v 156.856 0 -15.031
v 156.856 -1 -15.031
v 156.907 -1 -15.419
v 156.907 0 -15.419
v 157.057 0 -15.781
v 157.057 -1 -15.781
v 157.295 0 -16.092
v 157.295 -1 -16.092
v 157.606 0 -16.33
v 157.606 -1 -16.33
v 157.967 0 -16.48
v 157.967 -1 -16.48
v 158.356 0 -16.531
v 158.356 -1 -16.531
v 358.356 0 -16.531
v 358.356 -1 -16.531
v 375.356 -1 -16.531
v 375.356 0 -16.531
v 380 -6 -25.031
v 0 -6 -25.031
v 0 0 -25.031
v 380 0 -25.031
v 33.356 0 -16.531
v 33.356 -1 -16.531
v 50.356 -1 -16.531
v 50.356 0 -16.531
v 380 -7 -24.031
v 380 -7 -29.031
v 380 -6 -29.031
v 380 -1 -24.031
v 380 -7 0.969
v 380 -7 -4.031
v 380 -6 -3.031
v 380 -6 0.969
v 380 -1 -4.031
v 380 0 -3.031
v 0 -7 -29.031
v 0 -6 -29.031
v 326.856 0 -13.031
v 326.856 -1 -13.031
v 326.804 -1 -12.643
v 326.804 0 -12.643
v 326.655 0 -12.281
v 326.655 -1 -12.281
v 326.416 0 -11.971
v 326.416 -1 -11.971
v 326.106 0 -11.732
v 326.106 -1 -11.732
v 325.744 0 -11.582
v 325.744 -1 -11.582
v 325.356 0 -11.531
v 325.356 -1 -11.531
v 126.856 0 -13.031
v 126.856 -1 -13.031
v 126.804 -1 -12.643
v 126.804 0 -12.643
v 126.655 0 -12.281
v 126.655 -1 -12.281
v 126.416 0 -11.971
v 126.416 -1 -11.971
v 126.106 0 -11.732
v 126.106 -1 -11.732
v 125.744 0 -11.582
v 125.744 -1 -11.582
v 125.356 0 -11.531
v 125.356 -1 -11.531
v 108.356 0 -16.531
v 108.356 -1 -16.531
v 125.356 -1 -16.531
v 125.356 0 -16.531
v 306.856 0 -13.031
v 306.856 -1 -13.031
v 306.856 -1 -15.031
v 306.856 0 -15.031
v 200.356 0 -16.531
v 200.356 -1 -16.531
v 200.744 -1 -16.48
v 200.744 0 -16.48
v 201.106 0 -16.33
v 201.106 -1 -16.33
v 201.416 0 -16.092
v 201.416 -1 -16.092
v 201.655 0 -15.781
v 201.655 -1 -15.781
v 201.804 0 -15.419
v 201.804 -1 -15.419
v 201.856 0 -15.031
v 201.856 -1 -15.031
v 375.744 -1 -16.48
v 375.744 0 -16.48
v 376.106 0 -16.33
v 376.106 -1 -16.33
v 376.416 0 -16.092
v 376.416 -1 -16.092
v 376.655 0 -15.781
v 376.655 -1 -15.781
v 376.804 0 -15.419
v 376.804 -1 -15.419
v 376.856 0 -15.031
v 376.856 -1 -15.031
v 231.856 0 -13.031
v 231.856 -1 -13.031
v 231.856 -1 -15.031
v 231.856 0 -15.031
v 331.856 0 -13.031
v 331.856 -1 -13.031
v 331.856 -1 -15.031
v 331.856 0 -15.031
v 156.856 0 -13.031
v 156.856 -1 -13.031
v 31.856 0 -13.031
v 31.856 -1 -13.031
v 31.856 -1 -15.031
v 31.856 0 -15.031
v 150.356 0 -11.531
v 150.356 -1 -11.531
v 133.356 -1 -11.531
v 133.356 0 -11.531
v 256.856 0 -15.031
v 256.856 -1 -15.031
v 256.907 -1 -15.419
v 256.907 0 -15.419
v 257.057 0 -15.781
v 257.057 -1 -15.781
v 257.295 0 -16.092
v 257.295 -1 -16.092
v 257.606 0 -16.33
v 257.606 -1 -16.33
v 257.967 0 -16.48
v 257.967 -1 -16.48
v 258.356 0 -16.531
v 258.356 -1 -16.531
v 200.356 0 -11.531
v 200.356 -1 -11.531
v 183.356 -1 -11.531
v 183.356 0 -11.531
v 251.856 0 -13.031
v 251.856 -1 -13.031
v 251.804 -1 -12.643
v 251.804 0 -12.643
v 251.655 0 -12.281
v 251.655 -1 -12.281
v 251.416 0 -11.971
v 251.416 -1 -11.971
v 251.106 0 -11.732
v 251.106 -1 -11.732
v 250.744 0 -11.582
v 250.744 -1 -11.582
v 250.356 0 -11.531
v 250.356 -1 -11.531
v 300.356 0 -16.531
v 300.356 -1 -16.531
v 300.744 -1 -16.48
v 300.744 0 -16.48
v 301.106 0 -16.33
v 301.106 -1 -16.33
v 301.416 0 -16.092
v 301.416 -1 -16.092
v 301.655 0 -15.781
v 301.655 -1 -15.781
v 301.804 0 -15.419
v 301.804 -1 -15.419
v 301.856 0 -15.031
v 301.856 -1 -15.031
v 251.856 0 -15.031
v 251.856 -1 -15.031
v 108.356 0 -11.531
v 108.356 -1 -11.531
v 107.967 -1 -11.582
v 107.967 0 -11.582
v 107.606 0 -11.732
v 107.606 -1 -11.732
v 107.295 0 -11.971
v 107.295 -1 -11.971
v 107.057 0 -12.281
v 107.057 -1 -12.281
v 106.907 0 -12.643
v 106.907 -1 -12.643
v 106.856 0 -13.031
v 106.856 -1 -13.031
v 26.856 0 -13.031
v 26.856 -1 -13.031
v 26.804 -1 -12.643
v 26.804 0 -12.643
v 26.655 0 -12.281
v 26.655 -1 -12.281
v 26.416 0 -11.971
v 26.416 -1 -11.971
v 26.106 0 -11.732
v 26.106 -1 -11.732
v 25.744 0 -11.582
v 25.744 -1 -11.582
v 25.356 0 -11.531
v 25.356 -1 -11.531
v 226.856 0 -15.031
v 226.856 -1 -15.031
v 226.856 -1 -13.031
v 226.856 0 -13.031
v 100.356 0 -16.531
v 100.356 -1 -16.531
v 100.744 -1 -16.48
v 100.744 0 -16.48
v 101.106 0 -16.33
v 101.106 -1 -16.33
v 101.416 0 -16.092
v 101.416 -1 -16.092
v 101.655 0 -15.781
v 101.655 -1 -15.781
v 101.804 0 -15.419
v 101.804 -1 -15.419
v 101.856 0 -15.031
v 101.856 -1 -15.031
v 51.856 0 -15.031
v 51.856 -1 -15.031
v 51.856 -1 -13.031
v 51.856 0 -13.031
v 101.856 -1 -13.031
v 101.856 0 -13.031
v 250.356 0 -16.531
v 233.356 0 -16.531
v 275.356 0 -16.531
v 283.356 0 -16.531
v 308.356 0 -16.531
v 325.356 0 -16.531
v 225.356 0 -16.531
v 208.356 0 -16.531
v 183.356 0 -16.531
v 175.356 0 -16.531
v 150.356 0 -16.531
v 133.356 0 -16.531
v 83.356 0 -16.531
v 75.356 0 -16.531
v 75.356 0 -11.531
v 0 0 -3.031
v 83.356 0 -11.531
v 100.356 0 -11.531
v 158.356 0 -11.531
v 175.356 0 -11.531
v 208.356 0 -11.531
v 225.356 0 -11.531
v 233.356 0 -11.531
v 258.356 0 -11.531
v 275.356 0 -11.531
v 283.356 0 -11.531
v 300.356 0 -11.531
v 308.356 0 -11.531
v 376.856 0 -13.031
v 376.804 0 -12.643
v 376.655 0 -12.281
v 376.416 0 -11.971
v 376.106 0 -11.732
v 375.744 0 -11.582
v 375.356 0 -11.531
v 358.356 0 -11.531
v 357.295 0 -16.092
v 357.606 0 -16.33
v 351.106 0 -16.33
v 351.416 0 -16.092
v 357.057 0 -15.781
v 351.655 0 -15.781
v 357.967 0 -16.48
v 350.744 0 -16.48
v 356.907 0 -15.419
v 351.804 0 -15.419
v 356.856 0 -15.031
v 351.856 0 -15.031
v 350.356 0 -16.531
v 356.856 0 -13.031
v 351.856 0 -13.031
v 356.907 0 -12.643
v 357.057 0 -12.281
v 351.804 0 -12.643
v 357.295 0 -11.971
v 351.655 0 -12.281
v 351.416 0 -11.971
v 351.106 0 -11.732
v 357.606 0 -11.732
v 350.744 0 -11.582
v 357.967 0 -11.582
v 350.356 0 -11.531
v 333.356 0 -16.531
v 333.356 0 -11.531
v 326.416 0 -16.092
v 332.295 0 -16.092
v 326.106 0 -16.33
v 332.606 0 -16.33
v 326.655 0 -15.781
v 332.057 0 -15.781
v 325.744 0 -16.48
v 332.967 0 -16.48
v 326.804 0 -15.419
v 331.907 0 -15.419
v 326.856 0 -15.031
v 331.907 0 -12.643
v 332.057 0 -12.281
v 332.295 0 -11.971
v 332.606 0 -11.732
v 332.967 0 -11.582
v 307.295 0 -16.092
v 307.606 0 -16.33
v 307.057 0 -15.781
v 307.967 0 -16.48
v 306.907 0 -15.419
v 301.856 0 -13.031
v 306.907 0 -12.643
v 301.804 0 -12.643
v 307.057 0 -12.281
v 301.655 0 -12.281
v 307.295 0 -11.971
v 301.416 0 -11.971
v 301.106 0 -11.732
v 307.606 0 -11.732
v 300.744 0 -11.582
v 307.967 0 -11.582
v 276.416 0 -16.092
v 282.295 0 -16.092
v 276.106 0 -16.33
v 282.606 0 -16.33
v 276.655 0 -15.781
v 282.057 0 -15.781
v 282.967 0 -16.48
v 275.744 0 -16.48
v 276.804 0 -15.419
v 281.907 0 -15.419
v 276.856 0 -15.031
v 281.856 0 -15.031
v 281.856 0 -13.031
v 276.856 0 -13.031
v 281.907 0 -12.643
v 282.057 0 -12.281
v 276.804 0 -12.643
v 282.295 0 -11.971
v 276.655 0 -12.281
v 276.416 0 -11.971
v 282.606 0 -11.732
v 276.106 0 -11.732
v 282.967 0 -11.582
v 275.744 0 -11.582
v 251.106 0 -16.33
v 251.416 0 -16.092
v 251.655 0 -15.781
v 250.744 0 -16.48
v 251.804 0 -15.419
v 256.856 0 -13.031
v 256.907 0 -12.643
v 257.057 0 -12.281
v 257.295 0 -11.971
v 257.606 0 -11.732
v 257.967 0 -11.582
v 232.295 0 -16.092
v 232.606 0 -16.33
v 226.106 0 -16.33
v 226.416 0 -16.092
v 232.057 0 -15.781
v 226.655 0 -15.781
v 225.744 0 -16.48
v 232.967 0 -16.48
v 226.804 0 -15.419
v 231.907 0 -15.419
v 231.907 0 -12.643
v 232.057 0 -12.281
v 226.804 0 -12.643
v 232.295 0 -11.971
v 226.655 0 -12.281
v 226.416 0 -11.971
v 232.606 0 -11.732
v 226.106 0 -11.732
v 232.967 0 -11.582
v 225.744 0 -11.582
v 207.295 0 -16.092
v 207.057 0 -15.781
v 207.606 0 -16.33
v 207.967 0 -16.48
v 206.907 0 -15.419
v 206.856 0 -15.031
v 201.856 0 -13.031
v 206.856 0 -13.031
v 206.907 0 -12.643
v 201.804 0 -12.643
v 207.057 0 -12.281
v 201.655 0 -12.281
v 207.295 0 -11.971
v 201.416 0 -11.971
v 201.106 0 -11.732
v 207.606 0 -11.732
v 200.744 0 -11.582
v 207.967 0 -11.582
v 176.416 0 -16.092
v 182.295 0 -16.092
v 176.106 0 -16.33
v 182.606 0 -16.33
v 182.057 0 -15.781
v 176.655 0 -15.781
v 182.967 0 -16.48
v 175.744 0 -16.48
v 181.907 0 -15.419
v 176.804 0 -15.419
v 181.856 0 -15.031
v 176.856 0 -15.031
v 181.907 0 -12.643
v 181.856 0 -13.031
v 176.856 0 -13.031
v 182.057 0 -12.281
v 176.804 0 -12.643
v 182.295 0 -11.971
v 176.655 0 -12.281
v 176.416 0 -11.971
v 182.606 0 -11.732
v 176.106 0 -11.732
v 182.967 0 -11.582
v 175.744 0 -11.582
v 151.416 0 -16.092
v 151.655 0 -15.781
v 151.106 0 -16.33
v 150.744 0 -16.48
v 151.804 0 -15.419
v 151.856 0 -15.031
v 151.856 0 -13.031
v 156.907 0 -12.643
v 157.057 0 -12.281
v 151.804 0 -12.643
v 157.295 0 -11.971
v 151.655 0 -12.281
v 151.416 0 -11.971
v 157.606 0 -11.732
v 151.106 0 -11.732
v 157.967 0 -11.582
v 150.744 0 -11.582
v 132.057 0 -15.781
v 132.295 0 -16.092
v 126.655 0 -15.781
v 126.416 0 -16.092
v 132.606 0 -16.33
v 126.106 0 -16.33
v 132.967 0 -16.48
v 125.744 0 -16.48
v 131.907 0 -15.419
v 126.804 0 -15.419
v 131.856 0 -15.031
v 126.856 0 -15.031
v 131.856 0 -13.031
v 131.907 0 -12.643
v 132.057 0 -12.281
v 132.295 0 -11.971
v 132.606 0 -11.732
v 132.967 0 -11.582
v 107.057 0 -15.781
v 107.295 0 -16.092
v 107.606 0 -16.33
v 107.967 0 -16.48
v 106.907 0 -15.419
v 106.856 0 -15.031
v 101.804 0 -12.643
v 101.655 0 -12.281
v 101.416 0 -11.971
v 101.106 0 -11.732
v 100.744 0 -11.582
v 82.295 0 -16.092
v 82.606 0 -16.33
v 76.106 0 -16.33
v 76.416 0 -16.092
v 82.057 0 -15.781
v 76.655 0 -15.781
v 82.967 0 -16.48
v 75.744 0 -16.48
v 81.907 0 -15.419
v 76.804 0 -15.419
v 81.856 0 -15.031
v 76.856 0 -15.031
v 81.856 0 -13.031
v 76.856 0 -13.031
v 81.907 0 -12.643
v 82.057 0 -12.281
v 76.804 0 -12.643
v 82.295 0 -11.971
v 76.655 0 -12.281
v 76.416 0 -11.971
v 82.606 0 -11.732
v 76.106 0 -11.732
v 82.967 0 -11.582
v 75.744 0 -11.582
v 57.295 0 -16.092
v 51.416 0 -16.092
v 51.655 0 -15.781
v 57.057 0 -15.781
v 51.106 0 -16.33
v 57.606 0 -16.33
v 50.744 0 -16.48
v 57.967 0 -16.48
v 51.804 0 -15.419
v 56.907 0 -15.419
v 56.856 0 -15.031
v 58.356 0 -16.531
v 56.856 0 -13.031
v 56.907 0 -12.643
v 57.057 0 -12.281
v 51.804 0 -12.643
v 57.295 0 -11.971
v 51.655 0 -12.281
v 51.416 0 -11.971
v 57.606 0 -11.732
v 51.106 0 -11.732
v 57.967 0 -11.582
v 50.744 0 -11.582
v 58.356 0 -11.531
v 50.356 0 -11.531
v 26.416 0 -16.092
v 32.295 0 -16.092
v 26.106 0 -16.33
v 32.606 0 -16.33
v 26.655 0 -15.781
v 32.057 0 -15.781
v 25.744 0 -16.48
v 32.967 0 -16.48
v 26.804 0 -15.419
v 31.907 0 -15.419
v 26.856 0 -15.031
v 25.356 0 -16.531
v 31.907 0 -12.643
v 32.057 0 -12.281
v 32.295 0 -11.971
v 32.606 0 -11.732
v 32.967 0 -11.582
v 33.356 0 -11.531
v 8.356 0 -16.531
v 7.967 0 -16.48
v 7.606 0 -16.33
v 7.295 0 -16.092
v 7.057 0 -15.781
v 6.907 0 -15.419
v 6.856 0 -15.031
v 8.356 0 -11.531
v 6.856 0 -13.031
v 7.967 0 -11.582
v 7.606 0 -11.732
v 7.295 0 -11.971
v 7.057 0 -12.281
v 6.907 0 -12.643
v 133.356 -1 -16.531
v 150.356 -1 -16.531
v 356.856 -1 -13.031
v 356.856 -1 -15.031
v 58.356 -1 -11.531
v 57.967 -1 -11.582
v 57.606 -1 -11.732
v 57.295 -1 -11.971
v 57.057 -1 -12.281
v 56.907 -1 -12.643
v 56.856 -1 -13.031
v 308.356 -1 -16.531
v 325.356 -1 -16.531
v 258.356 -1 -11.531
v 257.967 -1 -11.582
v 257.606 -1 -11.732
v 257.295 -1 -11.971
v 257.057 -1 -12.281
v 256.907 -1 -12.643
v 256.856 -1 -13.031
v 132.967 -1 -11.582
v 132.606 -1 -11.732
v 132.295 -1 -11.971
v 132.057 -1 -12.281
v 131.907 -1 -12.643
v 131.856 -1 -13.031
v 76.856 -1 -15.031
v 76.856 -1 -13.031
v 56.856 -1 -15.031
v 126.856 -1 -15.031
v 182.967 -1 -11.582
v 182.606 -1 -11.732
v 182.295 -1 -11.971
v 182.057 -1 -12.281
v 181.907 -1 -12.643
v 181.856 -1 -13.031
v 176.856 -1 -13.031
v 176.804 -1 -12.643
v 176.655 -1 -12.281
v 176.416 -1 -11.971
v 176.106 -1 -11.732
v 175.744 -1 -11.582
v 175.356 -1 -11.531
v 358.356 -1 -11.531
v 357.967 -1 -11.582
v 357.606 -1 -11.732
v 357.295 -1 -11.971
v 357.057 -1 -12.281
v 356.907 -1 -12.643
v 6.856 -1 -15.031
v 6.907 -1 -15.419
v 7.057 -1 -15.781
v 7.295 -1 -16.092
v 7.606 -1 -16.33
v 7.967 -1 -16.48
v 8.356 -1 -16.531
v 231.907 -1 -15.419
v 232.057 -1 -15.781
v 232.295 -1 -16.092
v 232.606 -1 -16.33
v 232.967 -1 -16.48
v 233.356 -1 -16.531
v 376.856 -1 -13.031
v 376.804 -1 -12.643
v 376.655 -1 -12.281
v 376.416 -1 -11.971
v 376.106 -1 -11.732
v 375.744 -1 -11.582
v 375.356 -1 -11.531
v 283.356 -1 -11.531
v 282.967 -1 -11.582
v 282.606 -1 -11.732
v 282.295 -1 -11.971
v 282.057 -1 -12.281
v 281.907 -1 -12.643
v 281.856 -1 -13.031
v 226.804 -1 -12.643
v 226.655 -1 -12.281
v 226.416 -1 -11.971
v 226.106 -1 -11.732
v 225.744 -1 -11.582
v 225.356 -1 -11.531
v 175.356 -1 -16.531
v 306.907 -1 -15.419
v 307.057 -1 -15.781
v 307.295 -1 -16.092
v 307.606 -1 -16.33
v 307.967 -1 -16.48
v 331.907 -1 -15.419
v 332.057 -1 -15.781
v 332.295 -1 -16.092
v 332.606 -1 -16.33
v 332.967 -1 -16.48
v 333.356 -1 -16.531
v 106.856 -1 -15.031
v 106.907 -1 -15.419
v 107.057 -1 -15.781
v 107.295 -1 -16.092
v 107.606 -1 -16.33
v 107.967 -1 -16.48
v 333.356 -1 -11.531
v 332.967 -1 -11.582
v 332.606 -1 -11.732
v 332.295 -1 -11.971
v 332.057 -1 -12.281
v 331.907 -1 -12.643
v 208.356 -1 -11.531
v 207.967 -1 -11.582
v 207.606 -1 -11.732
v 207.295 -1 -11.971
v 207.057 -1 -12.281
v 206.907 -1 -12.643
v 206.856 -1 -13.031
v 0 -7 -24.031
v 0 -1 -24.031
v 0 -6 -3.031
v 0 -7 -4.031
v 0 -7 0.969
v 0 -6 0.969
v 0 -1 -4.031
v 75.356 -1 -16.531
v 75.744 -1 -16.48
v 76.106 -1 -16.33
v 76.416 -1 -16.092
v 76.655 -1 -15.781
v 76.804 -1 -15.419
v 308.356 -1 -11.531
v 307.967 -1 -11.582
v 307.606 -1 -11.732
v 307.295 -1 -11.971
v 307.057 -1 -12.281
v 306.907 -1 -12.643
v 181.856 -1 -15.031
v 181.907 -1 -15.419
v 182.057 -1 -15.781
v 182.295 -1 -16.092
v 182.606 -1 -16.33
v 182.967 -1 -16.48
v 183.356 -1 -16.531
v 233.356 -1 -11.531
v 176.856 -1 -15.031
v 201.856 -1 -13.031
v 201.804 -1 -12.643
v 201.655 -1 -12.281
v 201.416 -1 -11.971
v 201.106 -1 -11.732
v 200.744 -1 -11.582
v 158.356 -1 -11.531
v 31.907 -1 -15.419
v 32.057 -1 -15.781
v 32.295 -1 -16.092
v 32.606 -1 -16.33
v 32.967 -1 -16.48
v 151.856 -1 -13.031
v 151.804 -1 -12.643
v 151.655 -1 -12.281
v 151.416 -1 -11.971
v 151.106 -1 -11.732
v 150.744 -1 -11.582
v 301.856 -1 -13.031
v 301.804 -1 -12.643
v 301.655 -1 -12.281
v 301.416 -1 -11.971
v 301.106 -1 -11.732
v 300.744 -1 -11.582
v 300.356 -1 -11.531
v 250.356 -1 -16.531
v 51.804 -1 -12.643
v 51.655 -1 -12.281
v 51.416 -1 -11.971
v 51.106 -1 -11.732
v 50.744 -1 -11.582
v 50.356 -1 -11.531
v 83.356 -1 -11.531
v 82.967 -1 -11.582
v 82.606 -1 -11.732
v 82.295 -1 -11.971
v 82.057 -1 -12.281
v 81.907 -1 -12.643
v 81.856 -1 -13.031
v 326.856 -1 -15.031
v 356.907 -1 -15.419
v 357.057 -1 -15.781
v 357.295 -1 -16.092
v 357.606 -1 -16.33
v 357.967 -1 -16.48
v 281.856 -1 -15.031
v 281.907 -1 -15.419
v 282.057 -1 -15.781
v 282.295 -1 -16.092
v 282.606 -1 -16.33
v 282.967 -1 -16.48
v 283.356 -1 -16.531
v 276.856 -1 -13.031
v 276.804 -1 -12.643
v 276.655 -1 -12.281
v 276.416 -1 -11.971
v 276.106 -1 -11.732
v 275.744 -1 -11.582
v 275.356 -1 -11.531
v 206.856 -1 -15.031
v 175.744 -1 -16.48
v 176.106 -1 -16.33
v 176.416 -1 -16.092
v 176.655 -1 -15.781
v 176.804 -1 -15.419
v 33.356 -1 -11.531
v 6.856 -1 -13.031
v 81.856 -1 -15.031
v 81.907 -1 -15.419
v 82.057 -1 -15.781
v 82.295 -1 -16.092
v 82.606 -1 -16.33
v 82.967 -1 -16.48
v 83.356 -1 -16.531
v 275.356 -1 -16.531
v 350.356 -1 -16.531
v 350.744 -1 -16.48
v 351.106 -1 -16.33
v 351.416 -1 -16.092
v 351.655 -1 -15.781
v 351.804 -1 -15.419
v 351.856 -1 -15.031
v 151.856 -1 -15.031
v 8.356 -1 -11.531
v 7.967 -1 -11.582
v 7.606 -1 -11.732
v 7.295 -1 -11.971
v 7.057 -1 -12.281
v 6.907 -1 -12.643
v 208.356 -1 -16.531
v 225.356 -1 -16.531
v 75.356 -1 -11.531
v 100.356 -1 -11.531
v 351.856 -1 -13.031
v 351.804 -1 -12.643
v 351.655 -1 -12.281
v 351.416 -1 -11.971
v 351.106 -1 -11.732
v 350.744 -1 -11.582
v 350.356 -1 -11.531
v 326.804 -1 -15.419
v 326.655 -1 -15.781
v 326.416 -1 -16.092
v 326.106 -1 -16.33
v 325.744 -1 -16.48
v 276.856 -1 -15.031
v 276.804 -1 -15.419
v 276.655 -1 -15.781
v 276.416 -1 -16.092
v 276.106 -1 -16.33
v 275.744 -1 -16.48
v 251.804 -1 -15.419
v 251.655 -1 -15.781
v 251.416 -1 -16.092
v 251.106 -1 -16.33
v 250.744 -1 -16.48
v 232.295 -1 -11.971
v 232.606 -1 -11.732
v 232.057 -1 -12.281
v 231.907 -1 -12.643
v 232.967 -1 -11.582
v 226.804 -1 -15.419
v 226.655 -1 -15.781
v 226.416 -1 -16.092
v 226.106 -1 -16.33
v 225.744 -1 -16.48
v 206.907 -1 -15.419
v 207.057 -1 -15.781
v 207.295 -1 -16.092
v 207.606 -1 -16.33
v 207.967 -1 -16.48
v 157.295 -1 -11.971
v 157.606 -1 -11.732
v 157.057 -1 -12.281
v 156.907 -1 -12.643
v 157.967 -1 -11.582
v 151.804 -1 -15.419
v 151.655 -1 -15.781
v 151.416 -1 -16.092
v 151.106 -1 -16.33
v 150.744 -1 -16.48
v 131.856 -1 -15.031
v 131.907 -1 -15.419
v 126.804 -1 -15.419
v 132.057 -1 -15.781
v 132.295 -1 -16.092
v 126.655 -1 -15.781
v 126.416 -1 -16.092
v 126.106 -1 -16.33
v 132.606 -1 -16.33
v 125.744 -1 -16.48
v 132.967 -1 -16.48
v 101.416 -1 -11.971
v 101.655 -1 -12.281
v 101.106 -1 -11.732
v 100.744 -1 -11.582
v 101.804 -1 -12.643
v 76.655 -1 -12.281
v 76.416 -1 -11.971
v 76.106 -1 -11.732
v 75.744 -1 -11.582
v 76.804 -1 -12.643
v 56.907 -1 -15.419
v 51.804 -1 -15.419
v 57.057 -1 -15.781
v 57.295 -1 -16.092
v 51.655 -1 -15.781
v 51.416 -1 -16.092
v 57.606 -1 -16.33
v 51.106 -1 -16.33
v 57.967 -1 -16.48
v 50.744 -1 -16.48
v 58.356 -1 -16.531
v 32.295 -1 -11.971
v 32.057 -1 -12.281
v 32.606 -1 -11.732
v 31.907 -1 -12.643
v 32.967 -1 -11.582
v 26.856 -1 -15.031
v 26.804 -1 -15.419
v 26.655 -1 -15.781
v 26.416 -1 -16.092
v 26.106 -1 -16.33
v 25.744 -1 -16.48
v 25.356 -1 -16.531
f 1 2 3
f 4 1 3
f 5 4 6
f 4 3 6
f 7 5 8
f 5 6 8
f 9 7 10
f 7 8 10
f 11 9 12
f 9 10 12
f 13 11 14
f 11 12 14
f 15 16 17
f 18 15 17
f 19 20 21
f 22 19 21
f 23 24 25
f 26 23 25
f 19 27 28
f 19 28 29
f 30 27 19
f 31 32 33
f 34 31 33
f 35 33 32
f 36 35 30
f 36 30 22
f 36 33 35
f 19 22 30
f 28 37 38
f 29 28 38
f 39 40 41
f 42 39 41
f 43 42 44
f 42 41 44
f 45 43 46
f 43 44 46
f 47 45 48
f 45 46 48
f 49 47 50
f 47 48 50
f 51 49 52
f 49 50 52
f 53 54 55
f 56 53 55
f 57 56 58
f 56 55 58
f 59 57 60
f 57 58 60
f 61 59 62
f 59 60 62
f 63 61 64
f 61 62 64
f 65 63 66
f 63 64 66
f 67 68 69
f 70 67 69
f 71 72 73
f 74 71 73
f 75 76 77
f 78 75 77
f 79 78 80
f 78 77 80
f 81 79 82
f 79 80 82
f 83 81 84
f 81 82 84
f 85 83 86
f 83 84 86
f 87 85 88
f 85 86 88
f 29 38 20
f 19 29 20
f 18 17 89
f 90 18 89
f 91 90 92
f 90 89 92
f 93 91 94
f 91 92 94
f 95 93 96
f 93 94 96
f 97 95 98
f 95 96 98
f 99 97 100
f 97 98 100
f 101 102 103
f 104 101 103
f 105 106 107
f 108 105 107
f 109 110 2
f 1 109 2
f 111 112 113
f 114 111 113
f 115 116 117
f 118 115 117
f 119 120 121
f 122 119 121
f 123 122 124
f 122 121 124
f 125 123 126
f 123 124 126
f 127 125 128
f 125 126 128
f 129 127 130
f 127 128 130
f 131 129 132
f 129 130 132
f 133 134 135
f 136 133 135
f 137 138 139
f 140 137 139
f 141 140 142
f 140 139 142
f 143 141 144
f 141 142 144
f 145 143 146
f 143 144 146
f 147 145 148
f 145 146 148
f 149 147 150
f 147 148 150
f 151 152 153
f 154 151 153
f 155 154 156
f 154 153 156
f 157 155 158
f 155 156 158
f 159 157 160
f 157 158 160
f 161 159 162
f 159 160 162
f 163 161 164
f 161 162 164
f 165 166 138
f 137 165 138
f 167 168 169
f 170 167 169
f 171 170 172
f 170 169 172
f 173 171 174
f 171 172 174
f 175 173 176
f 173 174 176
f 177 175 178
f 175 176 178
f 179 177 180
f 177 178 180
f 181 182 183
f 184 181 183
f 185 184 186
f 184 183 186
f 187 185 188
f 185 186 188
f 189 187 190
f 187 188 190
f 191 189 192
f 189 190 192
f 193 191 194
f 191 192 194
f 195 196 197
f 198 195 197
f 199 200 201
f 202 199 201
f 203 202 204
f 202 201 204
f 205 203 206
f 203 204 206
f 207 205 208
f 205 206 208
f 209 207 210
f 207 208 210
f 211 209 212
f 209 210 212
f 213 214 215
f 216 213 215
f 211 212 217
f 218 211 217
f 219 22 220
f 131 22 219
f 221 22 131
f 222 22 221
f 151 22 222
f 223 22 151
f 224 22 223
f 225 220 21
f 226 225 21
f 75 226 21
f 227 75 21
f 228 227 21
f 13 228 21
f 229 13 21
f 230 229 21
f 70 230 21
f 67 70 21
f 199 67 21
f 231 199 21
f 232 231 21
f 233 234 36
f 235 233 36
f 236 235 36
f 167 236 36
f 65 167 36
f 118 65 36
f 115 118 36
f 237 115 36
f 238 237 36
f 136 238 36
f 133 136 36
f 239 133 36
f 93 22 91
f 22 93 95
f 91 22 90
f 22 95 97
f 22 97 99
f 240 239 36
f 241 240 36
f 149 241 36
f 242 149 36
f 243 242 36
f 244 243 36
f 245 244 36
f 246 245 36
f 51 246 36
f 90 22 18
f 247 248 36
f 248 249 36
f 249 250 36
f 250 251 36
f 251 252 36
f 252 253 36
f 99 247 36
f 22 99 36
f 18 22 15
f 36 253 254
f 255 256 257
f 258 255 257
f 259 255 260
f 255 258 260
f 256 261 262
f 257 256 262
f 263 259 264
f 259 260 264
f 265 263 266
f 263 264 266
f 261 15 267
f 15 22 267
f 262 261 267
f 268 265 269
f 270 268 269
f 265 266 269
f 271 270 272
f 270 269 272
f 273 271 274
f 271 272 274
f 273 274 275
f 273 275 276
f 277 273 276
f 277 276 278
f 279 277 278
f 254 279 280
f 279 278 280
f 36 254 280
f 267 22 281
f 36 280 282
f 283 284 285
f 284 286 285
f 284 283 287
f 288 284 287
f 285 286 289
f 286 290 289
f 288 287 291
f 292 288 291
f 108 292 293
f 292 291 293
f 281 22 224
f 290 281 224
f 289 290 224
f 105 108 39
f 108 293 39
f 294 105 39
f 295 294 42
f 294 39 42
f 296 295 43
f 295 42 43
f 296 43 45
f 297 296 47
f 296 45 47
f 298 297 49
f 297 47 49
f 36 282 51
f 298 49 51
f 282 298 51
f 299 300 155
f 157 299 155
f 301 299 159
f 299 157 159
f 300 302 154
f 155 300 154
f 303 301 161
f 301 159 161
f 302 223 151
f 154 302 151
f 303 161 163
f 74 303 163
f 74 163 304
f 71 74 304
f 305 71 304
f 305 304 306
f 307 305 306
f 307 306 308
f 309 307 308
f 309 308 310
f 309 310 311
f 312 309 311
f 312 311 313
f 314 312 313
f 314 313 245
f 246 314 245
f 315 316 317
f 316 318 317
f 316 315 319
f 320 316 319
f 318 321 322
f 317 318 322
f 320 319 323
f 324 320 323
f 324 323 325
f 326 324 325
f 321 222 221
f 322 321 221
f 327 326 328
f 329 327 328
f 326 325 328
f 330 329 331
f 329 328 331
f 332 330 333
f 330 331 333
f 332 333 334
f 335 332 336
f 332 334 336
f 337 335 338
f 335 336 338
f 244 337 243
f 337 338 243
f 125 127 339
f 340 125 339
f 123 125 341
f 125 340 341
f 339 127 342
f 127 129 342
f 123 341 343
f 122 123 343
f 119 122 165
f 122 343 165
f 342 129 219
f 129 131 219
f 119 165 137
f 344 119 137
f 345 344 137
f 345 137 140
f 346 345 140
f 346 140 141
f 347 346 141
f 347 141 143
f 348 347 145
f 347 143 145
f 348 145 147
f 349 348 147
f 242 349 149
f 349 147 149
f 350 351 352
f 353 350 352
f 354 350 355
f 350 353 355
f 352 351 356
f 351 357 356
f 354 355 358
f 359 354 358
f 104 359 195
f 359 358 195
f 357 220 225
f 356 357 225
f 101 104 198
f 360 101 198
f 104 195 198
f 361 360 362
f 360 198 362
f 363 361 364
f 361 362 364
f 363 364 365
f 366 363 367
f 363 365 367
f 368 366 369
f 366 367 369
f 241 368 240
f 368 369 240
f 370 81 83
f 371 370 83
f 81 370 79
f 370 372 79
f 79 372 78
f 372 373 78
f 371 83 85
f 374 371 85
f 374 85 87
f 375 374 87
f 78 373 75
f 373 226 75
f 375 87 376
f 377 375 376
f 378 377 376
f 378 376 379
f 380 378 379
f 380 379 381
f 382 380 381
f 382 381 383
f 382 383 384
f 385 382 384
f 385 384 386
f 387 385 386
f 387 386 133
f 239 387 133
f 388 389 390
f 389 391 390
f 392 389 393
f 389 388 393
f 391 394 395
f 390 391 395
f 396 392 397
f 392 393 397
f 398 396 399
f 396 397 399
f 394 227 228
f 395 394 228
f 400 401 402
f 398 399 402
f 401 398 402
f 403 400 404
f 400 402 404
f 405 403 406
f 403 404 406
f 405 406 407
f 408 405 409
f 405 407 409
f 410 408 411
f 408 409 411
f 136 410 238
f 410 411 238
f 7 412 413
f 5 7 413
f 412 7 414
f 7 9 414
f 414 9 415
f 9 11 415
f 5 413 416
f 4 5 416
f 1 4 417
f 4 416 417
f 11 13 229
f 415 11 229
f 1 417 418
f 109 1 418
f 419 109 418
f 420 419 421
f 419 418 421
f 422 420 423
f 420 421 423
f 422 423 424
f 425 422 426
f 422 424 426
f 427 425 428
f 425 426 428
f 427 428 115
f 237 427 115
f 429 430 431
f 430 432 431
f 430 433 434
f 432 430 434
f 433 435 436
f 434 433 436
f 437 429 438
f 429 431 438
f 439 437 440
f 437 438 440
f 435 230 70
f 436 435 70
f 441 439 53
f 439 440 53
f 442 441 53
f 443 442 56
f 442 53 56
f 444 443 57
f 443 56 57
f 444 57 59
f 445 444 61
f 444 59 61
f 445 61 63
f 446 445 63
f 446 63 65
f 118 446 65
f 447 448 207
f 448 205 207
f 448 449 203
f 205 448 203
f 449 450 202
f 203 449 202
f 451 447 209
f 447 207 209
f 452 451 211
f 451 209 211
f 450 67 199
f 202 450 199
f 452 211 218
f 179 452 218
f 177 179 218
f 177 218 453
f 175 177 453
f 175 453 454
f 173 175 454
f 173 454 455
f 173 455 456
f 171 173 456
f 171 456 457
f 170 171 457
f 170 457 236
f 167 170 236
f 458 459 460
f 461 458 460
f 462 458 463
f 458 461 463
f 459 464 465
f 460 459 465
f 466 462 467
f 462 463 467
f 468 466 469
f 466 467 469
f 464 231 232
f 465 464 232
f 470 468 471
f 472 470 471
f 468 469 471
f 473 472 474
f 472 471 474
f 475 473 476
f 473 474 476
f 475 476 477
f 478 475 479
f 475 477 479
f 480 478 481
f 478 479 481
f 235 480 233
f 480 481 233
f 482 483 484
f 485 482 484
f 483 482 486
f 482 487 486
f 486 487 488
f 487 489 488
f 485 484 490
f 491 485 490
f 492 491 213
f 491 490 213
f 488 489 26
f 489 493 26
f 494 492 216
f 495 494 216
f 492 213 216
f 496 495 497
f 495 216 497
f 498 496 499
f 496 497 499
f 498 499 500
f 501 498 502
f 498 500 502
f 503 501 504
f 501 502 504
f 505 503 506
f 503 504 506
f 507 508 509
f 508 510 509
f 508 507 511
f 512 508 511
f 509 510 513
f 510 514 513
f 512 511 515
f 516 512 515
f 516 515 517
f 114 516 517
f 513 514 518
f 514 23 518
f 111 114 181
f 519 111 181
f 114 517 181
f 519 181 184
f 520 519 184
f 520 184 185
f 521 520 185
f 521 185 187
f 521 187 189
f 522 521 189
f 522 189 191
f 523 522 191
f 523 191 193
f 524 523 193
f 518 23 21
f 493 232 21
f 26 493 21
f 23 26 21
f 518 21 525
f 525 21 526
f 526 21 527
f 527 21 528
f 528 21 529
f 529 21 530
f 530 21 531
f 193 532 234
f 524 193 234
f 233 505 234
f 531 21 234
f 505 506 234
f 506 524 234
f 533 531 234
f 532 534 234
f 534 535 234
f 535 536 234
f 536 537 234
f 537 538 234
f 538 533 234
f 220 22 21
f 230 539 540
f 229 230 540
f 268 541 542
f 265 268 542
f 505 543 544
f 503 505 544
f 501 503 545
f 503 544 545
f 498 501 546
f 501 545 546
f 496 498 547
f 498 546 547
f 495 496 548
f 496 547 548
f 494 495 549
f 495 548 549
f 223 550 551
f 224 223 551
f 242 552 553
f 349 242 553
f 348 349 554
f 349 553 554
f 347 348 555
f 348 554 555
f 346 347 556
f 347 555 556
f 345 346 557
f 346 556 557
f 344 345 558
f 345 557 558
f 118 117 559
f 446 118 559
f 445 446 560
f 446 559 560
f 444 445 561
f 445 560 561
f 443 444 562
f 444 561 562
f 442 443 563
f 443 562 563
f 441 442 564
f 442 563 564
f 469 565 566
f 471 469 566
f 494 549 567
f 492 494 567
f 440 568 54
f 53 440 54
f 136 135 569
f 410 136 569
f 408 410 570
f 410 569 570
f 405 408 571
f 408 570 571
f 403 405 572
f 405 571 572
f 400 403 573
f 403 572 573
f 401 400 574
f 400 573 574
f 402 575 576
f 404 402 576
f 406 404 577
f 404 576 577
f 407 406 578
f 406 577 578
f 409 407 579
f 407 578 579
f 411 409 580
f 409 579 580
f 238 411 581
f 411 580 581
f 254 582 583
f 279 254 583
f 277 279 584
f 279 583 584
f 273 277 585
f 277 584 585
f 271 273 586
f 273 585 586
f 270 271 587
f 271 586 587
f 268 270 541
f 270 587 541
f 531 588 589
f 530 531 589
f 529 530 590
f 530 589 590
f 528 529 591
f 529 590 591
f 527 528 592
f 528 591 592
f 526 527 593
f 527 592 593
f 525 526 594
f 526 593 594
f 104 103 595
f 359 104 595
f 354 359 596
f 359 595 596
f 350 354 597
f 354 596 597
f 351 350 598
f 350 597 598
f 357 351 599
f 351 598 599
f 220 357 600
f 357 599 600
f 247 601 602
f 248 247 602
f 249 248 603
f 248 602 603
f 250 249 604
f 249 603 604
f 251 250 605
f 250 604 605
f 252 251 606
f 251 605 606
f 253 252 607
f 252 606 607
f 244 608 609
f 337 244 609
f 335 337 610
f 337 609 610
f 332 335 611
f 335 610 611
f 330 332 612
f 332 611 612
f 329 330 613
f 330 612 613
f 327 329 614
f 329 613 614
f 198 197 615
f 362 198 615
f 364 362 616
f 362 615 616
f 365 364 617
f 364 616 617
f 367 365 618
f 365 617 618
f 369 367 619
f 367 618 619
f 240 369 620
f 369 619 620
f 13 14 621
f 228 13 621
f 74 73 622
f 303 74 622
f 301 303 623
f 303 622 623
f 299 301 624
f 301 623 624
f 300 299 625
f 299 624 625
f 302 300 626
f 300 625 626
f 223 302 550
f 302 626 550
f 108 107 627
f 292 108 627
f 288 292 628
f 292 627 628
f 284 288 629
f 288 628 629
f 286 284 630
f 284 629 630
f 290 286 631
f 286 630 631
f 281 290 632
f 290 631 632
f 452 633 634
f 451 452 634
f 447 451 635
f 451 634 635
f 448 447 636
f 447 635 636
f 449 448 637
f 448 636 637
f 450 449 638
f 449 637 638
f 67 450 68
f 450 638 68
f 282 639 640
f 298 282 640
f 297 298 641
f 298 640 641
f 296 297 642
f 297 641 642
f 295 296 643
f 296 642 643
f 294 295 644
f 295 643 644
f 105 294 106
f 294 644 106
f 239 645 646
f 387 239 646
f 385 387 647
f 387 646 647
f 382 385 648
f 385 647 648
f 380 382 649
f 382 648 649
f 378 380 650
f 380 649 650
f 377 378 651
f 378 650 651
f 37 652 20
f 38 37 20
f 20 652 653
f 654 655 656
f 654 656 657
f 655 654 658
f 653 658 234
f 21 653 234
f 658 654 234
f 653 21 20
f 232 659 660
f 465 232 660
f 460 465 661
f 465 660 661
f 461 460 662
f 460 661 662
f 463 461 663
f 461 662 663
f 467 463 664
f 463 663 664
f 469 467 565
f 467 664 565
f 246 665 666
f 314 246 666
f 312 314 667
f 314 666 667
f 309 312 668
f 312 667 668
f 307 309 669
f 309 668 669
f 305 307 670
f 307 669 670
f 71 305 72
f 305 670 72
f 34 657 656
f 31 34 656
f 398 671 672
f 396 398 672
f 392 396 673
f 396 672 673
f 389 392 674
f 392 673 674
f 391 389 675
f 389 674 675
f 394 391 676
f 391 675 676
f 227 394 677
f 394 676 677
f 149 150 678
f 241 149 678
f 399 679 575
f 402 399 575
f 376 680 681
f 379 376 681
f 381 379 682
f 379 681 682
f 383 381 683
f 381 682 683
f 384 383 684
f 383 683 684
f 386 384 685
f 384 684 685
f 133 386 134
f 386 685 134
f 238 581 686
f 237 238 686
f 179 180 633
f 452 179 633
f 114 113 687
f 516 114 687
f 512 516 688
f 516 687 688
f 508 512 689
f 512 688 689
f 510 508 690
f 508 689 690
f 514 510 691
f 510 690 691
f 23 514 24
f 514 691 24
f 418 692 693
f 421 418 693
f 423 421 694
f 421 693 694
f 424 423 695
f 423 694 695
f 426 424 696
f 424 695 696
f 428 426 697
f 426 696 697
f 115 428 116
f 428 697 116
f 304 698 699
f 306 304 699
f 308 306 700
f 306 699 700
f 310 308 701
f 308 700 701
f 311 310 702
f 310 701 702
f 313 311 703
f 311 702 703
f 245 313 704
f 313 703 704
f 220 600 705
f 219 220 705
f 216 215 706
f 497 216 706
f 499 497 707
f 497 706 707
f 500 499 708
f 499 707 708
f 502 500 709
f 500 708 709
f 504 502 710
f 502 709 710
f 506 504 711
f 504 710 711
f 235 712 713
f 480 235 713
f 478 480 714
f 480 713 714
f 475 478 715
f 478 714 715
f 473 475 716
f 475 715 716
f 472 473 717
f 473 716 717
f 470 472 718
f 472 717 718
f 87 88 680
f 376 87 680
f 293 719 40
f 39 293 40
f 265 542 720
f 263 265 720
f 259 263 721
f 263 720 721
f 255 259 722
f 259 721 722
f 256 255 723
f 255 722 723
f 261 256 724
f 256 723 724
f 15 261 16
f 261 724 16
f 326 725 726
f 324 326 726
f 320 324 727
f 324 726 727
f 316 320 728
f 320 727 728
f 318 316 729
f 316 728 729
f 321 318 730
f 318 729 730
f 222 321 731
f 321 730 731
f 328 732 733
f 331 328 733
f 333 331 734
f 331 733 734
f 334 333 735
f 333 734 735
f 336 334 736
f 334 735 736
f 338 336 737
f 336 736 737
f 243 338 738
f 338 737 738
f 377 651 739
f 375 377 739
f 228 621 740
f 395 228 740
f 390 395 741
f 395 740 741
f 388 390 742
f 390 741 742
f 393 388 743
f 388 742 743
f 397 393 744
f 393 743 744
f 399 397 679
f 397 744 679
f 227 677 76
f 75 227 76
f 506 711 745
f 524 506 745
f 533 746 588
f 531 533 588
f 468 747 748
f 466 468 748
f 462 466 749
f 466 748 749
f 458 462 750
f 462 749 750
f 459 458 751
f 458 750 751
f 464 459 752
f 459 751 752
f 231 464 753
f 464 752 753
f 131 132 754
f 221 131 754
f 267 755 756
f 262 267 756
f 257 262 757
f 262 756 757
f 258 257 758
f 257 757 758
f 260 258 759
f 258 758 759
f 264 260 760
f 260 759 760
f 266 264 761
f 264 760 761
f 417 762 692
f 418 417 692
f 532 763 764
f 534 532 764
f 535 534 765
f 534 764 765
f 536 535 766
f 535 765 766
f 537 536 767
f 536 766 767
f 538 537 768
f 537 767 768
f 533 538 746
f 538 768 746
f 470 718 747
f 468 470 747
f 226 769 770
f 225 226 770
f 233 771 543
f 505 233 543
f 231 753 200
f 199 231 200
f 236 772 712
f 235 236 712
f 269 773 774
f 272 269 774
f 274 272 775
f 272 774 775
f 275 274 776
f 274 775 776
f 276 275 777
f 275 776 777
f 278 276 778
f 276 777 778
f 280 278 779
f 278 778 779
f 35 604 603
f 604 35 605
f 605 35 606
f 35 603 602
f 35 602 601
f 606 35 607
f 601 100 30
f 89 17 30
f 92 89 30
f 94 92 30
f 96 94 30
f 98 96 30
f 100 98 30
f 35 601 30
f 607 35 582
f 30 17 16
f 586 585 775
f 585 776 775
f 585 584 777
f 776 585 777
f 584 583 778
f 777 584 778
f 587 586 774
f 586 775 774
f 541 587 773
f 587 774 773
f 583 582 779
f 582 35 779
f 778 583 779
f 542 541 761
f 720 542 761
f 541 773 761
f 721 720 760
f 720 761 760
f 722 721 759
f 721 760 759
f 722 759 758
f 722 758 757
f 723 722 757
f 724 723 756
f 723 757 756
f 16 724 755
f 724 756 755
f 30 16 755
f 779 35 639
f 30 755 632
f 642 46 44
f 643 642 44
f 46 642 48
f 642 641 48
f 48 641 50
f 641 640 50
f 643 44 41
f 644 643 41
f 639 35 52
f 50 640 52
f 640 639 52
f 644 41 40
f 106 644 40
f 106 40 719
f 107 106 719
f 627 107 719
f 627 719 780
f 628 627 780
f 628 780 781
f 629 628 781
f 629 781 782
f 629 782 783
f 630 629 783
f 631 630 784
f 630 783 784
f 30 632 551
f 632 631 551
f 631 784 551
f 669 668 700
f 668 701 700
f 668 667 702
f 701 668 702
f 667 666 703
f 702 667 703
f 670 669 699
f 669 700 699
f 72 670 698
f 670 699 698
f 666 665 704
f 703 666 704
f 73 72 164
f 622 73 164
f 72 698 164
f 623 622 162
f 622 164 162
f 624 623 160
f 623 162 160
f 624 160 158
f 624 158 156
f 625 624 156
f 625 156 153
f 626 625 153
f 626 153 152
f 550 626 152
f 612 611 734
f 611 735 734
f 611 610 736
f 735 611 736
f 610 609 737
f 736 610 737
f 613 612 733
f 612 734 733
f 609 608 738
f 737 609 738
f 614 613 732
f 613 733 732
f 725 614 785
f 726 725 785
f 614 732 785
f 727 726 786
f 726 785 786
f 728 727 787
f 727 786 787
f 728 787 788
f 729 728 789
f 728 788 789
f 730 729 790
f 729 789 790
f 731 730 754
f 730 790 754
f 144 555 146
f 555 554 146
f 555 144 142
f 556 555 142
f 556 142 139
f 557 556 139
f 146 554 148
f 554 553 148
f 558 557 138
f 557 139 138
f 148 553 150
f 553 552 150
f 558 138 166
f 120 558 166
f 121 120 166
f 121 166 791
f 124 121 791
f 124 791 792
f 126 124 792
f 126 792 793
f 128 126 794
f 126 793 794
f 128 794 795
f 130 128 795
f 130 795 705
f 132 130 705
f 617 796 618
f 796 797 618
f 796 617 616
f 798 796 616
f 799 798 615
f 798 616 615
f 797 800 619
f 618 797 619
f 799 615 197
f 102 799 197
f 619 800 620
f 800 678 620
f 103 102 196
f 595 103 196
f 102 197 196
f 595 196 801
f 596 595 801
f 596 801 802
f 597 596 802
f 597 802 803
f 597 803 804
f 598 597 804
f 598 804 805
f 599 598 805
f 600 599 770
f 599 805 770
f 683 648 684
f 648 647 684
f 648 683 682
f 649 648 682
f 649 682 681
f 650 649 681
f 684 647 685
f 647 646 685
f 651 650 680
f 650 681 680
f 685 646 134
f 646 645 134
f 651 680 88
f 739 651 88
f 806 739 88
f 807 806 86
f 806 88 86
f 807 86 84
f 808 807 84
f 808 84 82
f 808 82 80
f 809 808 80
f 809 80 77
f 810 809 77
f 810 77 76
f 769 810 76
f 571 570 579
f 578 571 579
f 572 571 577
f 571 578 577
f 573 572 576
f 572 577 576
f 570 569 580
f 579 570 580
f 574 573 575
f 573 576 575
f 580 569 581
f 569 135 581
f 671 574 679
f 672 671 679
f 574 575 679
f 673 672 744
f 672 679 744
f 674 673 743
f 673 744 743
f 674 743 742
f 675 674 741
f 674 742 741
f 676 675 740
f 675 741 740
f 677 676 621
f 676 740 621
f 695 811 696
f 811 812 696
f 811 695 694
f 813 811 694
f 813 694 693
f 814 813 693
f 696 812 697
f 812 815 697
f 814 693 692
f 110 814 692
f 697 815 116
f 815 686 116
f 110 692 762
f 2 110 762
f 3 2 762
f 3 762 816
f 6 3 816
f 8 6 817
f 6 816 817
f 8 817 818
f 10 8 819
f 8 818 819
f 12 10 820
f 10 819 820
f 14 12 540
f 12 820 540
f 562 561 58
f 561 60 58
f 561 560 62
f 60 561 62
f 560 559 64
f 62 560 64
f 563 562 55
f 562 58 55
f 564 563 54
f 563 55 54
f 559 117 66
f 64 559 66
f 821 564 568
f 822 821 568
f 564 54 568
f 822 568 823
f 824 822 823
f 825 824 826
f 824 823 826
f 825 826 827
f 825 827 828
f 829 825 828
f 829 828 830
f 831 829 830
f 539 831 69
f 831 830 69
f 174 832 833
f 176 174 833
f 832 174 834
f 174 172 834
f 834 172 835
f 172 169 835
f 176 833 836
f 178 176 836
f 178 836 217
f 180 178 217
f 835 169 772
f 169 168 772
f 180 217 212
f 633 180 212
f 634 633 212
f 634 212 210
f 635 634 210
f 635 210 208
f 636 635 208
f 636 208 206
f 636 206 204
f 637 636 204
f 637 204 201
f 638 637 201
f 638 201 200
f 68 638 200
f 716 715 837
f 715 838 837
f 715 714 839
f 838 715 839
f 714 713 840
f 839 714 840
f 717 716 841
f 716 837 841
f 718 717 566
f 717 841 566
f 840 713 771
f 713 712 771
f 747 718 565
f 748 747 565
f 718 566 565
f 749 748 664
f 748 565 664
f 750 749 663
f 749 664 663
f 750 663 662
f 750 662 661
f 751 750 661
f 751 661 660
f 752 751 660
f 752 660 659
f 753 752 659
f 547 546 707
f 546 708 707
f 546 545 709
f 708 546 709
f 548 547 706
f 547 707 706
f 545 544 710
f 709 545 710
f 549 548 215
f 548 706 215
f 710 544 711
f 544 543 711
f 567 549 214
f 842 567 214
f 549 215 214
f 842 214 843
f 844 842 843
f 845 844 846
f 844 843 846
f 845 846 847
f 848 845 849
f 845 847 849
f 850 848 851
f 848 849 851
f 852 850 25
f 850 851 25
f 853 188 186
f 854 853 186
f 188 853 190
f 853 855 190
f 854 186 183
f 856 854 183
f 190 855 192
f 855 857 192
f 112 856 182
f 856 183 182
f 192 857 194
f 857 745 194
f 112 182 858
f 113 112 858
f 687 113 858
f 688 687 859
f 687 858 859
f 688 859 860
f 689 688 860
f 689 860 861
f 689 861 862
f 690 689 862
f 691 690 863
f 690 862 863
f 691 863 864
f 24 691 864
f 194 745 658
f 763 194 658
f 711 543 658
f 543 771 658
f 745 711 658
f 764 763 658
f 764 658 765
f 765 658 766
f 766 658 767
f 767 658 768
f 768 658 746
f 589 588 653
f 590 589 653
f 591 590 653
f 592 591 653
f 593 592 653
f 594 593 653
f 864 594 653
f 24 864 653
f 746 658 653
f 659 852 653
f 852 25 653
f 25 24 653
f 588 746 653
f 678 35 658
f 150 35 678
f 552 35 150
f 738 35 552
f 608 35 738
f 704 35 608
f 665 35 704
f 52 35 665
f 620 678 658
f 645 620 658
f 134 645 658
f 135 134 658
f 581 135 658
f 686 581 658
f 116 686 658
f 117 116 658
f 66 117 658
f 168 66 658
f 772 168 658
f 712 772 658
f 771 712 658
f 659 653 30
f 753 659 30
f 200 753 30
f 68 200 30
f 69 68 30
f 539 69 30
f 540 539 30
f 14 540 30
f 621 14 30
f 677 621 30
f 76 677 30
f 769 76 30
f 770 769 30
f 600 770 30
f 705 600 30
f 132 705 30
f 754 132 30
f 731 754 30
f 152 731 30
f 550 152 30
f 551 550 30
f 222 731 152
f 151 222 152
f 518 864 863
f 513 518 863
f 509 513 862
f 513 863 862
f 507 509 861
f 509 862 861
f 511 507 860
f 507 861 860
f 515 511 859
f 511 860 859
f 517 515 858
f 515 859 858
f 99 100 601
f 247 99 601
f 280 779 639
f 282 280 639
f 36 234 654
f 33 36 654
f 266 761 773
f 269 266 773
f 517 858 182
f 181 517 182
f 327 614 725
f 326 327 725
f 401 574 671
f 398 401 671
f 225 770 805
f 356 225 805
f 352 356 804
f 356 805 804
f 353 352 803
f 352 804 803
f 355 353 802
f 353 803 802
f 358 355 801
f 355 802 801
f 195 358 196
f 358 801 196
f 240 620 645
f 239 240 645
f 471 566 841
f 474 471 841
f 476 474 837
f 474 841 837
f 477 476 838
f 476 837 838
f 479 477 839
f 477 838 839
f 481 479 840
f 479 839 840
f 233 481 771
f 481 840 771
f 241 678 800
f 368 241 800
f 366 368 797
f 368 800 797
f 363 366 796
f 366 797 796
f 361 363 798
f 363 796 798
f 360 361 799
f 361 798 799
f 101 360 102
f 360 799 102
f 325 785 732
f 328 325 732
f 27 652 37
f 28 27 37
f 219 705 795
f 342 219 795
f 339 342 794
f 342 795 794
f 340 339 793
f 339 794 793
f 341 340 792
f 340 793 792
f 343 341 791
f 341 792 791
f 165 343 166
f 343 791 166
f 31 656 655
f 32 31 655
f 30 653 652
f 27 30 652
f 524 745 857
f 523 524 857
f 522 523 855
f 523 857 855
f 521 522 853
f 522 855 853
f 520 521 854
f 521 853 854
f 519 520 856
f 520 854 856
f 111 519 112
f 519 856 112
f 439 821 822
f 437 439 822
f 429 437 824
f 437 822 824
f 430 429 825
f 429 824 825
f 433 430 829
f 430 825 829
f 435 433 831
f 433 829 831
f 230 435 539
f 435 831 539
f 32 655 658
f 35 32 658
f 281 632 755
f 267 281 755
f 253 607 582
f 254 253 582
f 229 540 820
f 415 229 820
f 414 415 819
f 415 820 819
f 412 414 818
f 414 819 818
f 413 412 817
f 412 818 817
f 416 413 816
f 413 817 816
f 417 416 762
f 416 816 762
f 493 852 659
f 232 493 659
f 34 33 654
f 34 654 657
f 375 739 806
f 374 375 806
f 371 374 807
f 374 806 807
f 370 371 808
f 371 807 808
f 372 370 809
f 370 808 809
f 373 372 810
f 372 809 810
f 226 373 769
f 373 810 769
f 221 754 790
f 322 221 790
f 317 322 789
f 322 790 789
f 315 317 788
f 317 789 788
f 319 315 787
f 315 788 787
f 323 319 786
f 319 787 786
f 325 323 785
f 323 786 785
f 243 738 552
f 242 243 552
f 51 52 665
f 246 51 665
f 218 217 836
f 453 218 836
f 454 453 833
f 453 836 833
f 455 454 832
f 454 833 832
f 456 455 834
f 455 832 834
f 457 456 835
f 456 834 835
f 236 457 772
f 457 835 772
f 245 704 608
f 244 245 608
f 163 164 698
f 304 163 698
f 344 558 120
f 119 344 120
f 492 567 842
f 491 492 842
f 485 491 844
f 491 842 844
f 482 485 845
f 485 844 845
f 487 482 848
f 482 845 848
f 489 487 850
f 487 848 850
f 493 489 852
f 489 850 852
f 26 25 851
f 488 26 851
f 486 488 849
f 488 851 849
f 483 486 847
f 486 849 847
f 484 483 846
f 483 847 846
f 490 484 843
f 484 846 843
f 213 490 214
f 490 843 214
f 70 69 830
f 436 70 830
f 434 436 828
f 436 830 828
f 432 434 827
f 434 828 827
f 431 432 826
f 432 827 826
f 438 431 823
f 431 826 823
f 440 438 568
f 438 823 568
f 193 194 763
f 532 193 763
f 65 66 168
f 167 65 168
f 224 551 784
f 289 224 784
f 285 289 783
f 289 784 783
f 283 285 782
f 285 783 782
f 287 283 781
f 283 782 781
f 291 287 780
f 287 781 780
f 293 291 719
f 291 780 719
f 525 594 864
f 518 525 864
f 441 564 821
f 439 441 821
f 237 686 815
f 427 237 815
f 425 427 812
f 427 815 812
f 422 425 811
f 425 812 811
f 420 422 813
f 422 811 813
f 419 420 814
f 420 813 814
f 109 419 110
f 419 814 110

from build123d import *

# Parameters (mm, degrees)
F1_DEPTH = 380
F3_DEPTH = 25


with BuildPart() as f1:
    # F0 (on Right) → F1 (new body)
    with BuildSketch(Plane.YZ):
        Polygon((0, -25.031198), (0, -3.031198), (-6, -3.031198), (-6, 0.968802), (-7, 0.968802), (-7, -4.031198), (-1, -4.031198), (-1, -24.031198), (-7, -24.031198), (-7, -29.031198), (-6, -29.031198), (-6, -25.031198), align=None)
    extrude(amount=F1_DEPTH)

    # F2 (on face) → F3 (cut)
    with BuildSketch(Plane.XZ.offset(1)):
        with BuildLine():
            Line((6.85557, -13.031198), (6.85557, -14.031198))
            Line((6.85557, -14.031198), (26.85557, -14.031198))
            Line((26.85557, -14.031198), (26.85557, -13.031198))
            ThreePointArc((26.85557, -13.031198), (26.41623, -11.970538), (25.35557, -11.531198))
            Line((25.35557, -11.531198), (8.35557, -11.531198))
            ThreePointArc((8.35557, -11.531198), (7.294909, -11.970538), (6.85557, -13.031198))
        make_face()
        with BuildLine():
            Line((26.85557, -14.031198), (6.85557, -14.031198))
            Line((6.85557, -14.031198), (6.85557, -15.031198))
            ThreePointArc((6.85557, -15.031198), (7.294909, -16.091858), (8.35557, -16.531198))
            Line((8.35557, -16.531198), (25.35557, -16.531198))
            ThreePointArc((25.35557, -16.531198), (26.41623, -16.091858), (26.85557, -15.031198))
            Line((26.85557, -15.031198), (26.85557, -14.031198))
        make_face()
        with BuildLine():
            Line((31.85557, -13.031198), (31.85557, -14.031198))
            Line((31.85557, -14.031198), (51.85557, -14.031198))
            Line((51.85557, -14.031198), (51.85557, -13.031198))
            ThreePointArc((51.85557, -13.031198), (51.41623, -11.970538), (50.35557, -11.531198))
            Line((50.35557, -11.531198), (33.35557, -11.531198))
            ThreePointArc((33.35557, -11.531198), (32.294909, -11.970538), (31.85557, -13.031198))
        make_face()
        with BuildLine():
            Line((51.85557, -14.031198), (31.85557, -14.031198))
            Line((31.85557, -14.031198), (31.85557, -15.031198))
            ThreePointArc((31.85557, -15.031198), (32.294909, -16.091858), (33.35557, -16.531198))
            Line((33.35557, -16.531198), (50.35557, -16.531198))
            ThreePointArc((50.35557, -16.531198), (51.41623, -16.091858), (51.85557, -15.031198))
            Line((51.85557, -15.031198), (51.85557, -14.031198))
        make_face()
        with BuildLine():
            Line((56.85557, -13.031198), (56.85557, -14.031198))
            Line((56.85557, -14.031198), (76.85557, -14.031198))
            Line((76.85557, -14.031198), (76.85557, -13.031198))
            ThreePointArc((76.85557, -13.031198), (76.41623, -11.970538), (75.35557, -11.531198))
            Line((75.35557, -11.531198), (58.35557, -11.531198))
            ThreePointArc((58.35557, -11.531198), (57.294909, -11.970538), (56.85557, -13.031198))
        make_face()
        with BuildLine():
            Line((76.85557, -14.031198), (56.85557, -14.031198))
            Line((56.85557, -14.031198), (56.85557, -15.031198))
            ThreePointArc((56.85557, -15.031198), (57.294909, -16.091858), (58.35557, -16.531198))
            Line((58.35557, -16.531198), (75.35557, -16.531198))
            ThreePointArc((75.35557, -16.531198), (76.41623, -16.091858), (76.85557, -15.031198))
            Line((76.85557, -15.031198), (76.85557, -14.031198))
        make_face()
        with BuildLine():
            Line((81.85557, -13.031198), (81.85557, -14.031198))
            Line((81.85557, -14.031198), (101.85557, -14.031198))
            Line((101.85557, -14.031198), (101.85557, -13.031198))
            ThreePointArc((101.85557, -13.031198), (101.41623, -11.970538), (100.35557, -11.531198))
            Line((100.35557, -11.531198), (83.35557, -11.531198))
            ThreePointArc((83.35557, -11.531198), (82.294909, -11.970538), (81.85557, -13.031198))
        make_face()
        with BuildLine():
            Line((101.85557, -14.031198), (81.85557, -14.031198))
            Line((81.85557, -14.031198), (81.85557, -15.031198))
            ThreePointArc((81.85557, -15.031198), (82.294909, -16.091858), (83.35557, -16.531198))
            Line((83.35557, -16.531198), (100.35557, -16.531198))
            ThreePointArc((100.35557, -16.531198), (101.41623, -16.091858), (101.85557, -15.031198))
            Line((101.85557, -15.031198), (101.85557, -14.031198))
        make_face()
        with BuildLine():
            Line((106.85557, -13.031198), (106.85557, -14.031198))
            Line((106.85557, -14.031198), (126.85557, -14.031198))
            Line((126.85557, -14.031198), (126.85557, -13.031198))
            ThreePointArc((126.85557, -13.031198), (126.41623, -11.970538), (125.35557, -11.531198))
            Line((125.35557, -11.531198), (108.35557, -11.531198))
            ThreePointArc((108.35557, -11.531198), (107.294909, -11.970538), (106.85557, -13.031198))
        make_face()
        with BuildLine():
            Line((126.85557, -14.031198), (106.85557, -14.031198))
            Line((106.85557, -14.031198), (106.85557, -15.031198))
            ThreePointArc((106.85557, -15.031198), (107.294909, -16.091858), (108.35557, -16.531198))
            Line((108.35557, -16.531198), (125.35557, -16.531198))
            ThreePointArc((125.35557, -16.531198), (126.41623, -16.091858), (126.85557, -15.031198))
            Line((126.85557, -15.031198), (126.85557, -14.031198))
        make_face()
        with BuildLine():
            Line((131.85557, -13.031198), (131.85557, -14.031198))
            Line((131.85557, -14.031198), (151.85557, -14.031198))
            Line((151.85557, -14.031198), (151.85557, -13.031198))
            ThreePointArc((151.85557, -13.031198), (151.41623, -11.970538), (150.35557, -11.531198))
            Line((150.35557, -11.531198), (133.35557, -11.531198))
            ThreePointArc((133.35557, -11.531198), (132.294909, -11.970538), (131.85557, -13.031198))
        make_face()
        with BuildLine():
            Line((151.85557, -14.031198), (131.85557, -14.031198))
            Line((131.85557, -14.031198), (131.85557, -15.031198))
            ThreePointArc((131.85557, -15.031198), (132.294909, -16.091858), (133.35557, -16.531198))
            Line((133.35557, -16.531198), (150.35557, -16.531198))
            ThreePointArc((150.35557, -16.531198), (151.41623, -16.091858), (151.85557, -15.031198))
            Line((151.85557, -15.031198), (151.85557, -14.031198))
        make_face()
        with BuildLine():
            Line((176.85557, -14.031198), (156.85557, -14.031198))
            Line((156.85557, -14.031198), (156.85557, -15.031198))
            ThreePointArc((156.85557, -15.031198), (157.294909, -16.091858), (158.35557, -16.531198))
            Line((158.35557, -16.531198), (175.35557, -16.531198))
            ThreePointArc((175.35557, -16.531198), (176.41623, -16.091858), (176.85557, -15.031198))
            Line((176.85557, -15.031198), (176.85557, -14.031198))
        make_face()
        with BuildLine():
            Line((156.85557, -13.031198), (156.85557, -14.031198))
            Line((156.85557, -14.031198), (176.85557, -14.031198))
            Line((176.85557, -14.031198), (176.85557, -13.031198))
            ThreePointArc((176.85557, -13.031198), (176.41623, -11.970538), (175.35557, -11.531198))
            Line((175.35557, -11.531198), (158.35557, -11.531198))
            ThreePointArc((158.35557, -11.531198), (157.294909, -11.970538), (156.85557, -13.031198))
        make_face()
        with BuildLine():
            Line((181.85557, -13.031198), (181.85557, -14.031198))
            Line((181.85557, -14.031198), (201.85557, -14.031198))
            Line((201.85557, -14.031198), (201.85557, -13.031198))
            ThreePointArc((201.85557, -13.031198), (201.41623, -11.970538), (200.35557, -11.531198))
            Line((200.35557, -11.531198), (183.35557, -11.531198))
            ThreePointArc((183.35557, -11.531198), (182.294909, -11.970538), (181.85557, -13.031198))
        make_face()
        with BuildLine():
            Line((201.85557, -14.031198), (181.85557, -14.031198))
            Line((181.85557, -14.031198), (181.85557, -15.031198))
            ThreePointArc((181.85557, -15.031198), (182.294909, -16.091858), (183.35557, -16.531198))
            Line((183.35557, -16.531198), (200.35557, -16.531198))
            ThreePointArc((200.35557, -16.531198), (201.41623, -16.091858), (201.85557, -15.031198))
            Line((201.85557, -15.031198), (201.85557, -14.031198))
        make_face()
        with BuildLine():
            Line((226.85557, -15.031198), (226.85557, -14.031198))
            Line((226.85557, -14.031198), (206.85557, -14.031198))
            Line((206.85557, -14.031198), (206.85557, -15.031198))
            ThreePointArc((206.85557, -15.031198), (207.294909, -16.091858), (208.35557, -16.531198))
            Line((208.35557, -16.531198), (225.35557, -16.531198))
            ThreePointArc((225.35557, -16.531198), (226.41623, -16.091858), (226.85557, -15.031198))
        make_face()
        with BuildLine():
            Line((206.85557, -14.031198), (226.85557, -14.031198))
            Line((226.85557, -14.031198), (226.85557, -13.031198))
            ThreePointArc((226.85557, -13.031198), (226.41623, -11.970538), (225.35557, -11.531198))
            Line((225.35557, -11.531198), (208.35557, -11.531198))
            ThreePointArc((208.35557, -11.531198), (207.294909, -11.970538), (206.85557, -13.031198))
            Line((206.85557, -13.031198), (206.85557, -14.031198))
        make_face()
        with BuildLine():
            Line((251.85557, -15.031198), (251.85557, -14.031198))
            Line((251.85557, -14.031198), (231.85557, -14.031198))
            Line((231.85557, -14.031198), (231.85557, -15.031198))
            ThreePointArc((231.85557, -15.031198), (232.294909, -16.091858), (233.35557, -16.531198))
            Line((233.35557, -16.531198), (250.35557, -16.531198))
            ThreePointArc((250.35557, -16.531198), (251.41623, -16.091858), (251.85557, -15.031198))
        make_face()
        with BuildLine():
            Line((231.85557, -14.031198), (251.85557, -14.031198))
            Line((251.85557, -14.031198), (251.85557, -13.031198))
            ThreePointArc((251.85557, -13.031198), (251.41623, -11.970538), (250.35557, -11.531198))
            Line((250.35557, -11.531198), (233.35557, -11.531198))
            ThreePointArc((233.35557, -11.531198), (232.294909, -11.970538), (231.85557, -13.031198))
            Line((231.85557, -13.031198), (231.85557, -14.031198))
        make_face()
        with BuildLine():
            Line((276.85557, -15.031198), (276.85557, -14.031198))
            Line((276.85557, -14.031198), (256.85557, -14.031198))
            Line((256.85557, -14.031198), (256.85557, -15.031198))
            ThreePointArc((256.85557, -15.031198), (257.294909, -16.091858), (258.35557, -16.531198))
            Line((258.35557, -16.531198), (275.35557, -16.531198))
            ThreePointArc((275.35557, -16.531198), (276.41623, -16.091858), (276.85557, -15.031198))
        make_face()
        with BuildLine():
            Line((256.85557, -14.031198), (276.85557, -14.031198))
            Line((276.85557, -14.031198), (276.85557, -13.031198))
            ThreePointArc((276.85557, -13.031198), (276.41623, -11.970538), (275.35557, -11.531198))
            Line((275.35557, -11.531198), (258.35557, -11.531198))
            ThreePointArc((258.35557, -11.531198), (257.294909, -11.970538), (256.85557, -13.031198))
            Line((256.85557, -13.031198), (256.85557, -14.031198))
        make_face()
        with BuildLine():
            Line((301.85557, -15.031198), (301.85557, -14.031198))
            Line((301.85557, -14.031198), (281.85557, -14.031198))
            Line((281.85557, -14.031198), (281.85557, -15.031198))
            ThreePointArc((281.85557, -15.031198), (282.294909, -16.091858), (283.35557, -16.531198))
            Line((283.35557, -16.531198), (300.35557, -16.531198))
            ThreePointArc((300.35557, -16.531198), (301.41623, -16.091858), (301.85557, -15.031198))
        make_face()
        with BuildLine():
            Line((281.85557, -14.031198), (301.85557, -14.031198))
            Line((301.85557, -14.031198), (301.85557, -13.031198))
            ThreePointArc((301.85557, -13.031198), (301.41623, -11.970538), (300.35557, -11.531198))
            Line((300.35557, -11.531198), (283.35557, -11.531198))
            ThreePointArc((283.35557, -11.531198), (282.294909, -11.970538), (281.85557, -13.031198))
            Line((281.85557, -13.031198), (281.85557, -14.031198))
        make_face()
        with BuildLine():
            Line((306.85557, -14.031198), (326.85557, -14.031198))
            Line((326.85557, -14.031198), (326.85557, -13.031198))
            ThreePointArc((326.85557, -13.031198), (326.41623, -11.970538), (325.35557, -11.531198))
            Line((325.35557, -11.531198), (308.35557, -11.531198))
            ThreePointArc((308.35557, -11.531198), (307.294909, -11.970538), (306.85557, -13.031198))
            Line((306.85557, -13.031198), (306.85557, -14.031198))
        make_face()
        with BuildLine():
            Line((326.85557, -15.031198), (326.85557, -14.031198))
            Line((326.85557, -14.031198), (306.85557, -14.031198))
            Line((306.85557, -14.031198), (306.85557, -15.031198))
            ThreePointArc((306.85557, -15.031198), (307.294909, -16.091858), (308.35557, -16.531198))
            Line((308.35557, -16.531198), (325.35557, -16.531198))
            ThreePointArc((325.35557, -16.531198), (326.41623, -16.091858), (326.85557, -15.031198))
        make_face()
        with BuildLine():
            Line((351.85557, -15.031198), (351.85557, -14.031198))
            Line((351.85557, -14.031198), (331.85557, -14.031198))
            Line((331.85557, -14.031198), (331.85557, -15.031198))
            ThreePointArc((331.85557, -15.031198), (332.294909, -16.091858), (333.35557, -16.531198))
            Line((333.35557, -16.531198), (350.35557, -16.531198))
            ThreePointArc((350.35557, -16.531198), (351.41623, -16.091858), (351.85557, -15.031198))
        make_face()
        with BuildLine():
            Line((331.85557, -14.031198), (351.85557, -14.031198))
            Line((351.85557, -14.031198), (351.85557, -13.031198))
            ThreePointArc((351.85557, -13.031198), (351.41623, -11.970538), (350.35557, -11.531198))
            Line((350.35557, -11.531198), (333.35557, -11.531198))
            ThreePointArc((333.35557, -11.531198), (332.294909, -11.970538), (331.85557, -13.031198))
            Line((331.85557, -13.031198), (331.85557, -14.031198))
        make_face()
        with BuildLine():
            Line((356.85557, -14.031198), (376.85557, -14.031198))
            Line((376.85557, -14.031198), (376.85557, -13.031198))
            ThreePointArc((376.85557, -13.031198), (376.41623, -11.970538), (375.35557, -11.531198))
            Line((375.35557, -11.531198), (358.35557, -11.531198))
            ThreePointArc((358.35557, -11.531198), (357.294909, -11.970538), (356.85557, -13.031198))
            Line((356.85557, -13.031198), (356.85557, -14.031198))
        make_face()
        with BuildLine():
            Line((376.85557, -15.031198), (376.85557, -14.031198))
            Line((376.85557, -14.031198), (356.85557, -14.031198))
            Line((356.85557, -14.031198), (356.85557, -15.031198))
            ThreePointArc((356.85557, -15.031198), (357.294909, -16.091858), (358.35557, -16.531198))
            Line((358.35557, -16.531198), (375.35557, -16.531198))
            ThreePointArc((375.35557, -16.531198), (376.41623, -16.091858), (376.85557, -15.031198))
        make_face()
    extrude(amount=-F3_DEPTH, mode=Mode.SUBTRACT)


solid = f1.part
